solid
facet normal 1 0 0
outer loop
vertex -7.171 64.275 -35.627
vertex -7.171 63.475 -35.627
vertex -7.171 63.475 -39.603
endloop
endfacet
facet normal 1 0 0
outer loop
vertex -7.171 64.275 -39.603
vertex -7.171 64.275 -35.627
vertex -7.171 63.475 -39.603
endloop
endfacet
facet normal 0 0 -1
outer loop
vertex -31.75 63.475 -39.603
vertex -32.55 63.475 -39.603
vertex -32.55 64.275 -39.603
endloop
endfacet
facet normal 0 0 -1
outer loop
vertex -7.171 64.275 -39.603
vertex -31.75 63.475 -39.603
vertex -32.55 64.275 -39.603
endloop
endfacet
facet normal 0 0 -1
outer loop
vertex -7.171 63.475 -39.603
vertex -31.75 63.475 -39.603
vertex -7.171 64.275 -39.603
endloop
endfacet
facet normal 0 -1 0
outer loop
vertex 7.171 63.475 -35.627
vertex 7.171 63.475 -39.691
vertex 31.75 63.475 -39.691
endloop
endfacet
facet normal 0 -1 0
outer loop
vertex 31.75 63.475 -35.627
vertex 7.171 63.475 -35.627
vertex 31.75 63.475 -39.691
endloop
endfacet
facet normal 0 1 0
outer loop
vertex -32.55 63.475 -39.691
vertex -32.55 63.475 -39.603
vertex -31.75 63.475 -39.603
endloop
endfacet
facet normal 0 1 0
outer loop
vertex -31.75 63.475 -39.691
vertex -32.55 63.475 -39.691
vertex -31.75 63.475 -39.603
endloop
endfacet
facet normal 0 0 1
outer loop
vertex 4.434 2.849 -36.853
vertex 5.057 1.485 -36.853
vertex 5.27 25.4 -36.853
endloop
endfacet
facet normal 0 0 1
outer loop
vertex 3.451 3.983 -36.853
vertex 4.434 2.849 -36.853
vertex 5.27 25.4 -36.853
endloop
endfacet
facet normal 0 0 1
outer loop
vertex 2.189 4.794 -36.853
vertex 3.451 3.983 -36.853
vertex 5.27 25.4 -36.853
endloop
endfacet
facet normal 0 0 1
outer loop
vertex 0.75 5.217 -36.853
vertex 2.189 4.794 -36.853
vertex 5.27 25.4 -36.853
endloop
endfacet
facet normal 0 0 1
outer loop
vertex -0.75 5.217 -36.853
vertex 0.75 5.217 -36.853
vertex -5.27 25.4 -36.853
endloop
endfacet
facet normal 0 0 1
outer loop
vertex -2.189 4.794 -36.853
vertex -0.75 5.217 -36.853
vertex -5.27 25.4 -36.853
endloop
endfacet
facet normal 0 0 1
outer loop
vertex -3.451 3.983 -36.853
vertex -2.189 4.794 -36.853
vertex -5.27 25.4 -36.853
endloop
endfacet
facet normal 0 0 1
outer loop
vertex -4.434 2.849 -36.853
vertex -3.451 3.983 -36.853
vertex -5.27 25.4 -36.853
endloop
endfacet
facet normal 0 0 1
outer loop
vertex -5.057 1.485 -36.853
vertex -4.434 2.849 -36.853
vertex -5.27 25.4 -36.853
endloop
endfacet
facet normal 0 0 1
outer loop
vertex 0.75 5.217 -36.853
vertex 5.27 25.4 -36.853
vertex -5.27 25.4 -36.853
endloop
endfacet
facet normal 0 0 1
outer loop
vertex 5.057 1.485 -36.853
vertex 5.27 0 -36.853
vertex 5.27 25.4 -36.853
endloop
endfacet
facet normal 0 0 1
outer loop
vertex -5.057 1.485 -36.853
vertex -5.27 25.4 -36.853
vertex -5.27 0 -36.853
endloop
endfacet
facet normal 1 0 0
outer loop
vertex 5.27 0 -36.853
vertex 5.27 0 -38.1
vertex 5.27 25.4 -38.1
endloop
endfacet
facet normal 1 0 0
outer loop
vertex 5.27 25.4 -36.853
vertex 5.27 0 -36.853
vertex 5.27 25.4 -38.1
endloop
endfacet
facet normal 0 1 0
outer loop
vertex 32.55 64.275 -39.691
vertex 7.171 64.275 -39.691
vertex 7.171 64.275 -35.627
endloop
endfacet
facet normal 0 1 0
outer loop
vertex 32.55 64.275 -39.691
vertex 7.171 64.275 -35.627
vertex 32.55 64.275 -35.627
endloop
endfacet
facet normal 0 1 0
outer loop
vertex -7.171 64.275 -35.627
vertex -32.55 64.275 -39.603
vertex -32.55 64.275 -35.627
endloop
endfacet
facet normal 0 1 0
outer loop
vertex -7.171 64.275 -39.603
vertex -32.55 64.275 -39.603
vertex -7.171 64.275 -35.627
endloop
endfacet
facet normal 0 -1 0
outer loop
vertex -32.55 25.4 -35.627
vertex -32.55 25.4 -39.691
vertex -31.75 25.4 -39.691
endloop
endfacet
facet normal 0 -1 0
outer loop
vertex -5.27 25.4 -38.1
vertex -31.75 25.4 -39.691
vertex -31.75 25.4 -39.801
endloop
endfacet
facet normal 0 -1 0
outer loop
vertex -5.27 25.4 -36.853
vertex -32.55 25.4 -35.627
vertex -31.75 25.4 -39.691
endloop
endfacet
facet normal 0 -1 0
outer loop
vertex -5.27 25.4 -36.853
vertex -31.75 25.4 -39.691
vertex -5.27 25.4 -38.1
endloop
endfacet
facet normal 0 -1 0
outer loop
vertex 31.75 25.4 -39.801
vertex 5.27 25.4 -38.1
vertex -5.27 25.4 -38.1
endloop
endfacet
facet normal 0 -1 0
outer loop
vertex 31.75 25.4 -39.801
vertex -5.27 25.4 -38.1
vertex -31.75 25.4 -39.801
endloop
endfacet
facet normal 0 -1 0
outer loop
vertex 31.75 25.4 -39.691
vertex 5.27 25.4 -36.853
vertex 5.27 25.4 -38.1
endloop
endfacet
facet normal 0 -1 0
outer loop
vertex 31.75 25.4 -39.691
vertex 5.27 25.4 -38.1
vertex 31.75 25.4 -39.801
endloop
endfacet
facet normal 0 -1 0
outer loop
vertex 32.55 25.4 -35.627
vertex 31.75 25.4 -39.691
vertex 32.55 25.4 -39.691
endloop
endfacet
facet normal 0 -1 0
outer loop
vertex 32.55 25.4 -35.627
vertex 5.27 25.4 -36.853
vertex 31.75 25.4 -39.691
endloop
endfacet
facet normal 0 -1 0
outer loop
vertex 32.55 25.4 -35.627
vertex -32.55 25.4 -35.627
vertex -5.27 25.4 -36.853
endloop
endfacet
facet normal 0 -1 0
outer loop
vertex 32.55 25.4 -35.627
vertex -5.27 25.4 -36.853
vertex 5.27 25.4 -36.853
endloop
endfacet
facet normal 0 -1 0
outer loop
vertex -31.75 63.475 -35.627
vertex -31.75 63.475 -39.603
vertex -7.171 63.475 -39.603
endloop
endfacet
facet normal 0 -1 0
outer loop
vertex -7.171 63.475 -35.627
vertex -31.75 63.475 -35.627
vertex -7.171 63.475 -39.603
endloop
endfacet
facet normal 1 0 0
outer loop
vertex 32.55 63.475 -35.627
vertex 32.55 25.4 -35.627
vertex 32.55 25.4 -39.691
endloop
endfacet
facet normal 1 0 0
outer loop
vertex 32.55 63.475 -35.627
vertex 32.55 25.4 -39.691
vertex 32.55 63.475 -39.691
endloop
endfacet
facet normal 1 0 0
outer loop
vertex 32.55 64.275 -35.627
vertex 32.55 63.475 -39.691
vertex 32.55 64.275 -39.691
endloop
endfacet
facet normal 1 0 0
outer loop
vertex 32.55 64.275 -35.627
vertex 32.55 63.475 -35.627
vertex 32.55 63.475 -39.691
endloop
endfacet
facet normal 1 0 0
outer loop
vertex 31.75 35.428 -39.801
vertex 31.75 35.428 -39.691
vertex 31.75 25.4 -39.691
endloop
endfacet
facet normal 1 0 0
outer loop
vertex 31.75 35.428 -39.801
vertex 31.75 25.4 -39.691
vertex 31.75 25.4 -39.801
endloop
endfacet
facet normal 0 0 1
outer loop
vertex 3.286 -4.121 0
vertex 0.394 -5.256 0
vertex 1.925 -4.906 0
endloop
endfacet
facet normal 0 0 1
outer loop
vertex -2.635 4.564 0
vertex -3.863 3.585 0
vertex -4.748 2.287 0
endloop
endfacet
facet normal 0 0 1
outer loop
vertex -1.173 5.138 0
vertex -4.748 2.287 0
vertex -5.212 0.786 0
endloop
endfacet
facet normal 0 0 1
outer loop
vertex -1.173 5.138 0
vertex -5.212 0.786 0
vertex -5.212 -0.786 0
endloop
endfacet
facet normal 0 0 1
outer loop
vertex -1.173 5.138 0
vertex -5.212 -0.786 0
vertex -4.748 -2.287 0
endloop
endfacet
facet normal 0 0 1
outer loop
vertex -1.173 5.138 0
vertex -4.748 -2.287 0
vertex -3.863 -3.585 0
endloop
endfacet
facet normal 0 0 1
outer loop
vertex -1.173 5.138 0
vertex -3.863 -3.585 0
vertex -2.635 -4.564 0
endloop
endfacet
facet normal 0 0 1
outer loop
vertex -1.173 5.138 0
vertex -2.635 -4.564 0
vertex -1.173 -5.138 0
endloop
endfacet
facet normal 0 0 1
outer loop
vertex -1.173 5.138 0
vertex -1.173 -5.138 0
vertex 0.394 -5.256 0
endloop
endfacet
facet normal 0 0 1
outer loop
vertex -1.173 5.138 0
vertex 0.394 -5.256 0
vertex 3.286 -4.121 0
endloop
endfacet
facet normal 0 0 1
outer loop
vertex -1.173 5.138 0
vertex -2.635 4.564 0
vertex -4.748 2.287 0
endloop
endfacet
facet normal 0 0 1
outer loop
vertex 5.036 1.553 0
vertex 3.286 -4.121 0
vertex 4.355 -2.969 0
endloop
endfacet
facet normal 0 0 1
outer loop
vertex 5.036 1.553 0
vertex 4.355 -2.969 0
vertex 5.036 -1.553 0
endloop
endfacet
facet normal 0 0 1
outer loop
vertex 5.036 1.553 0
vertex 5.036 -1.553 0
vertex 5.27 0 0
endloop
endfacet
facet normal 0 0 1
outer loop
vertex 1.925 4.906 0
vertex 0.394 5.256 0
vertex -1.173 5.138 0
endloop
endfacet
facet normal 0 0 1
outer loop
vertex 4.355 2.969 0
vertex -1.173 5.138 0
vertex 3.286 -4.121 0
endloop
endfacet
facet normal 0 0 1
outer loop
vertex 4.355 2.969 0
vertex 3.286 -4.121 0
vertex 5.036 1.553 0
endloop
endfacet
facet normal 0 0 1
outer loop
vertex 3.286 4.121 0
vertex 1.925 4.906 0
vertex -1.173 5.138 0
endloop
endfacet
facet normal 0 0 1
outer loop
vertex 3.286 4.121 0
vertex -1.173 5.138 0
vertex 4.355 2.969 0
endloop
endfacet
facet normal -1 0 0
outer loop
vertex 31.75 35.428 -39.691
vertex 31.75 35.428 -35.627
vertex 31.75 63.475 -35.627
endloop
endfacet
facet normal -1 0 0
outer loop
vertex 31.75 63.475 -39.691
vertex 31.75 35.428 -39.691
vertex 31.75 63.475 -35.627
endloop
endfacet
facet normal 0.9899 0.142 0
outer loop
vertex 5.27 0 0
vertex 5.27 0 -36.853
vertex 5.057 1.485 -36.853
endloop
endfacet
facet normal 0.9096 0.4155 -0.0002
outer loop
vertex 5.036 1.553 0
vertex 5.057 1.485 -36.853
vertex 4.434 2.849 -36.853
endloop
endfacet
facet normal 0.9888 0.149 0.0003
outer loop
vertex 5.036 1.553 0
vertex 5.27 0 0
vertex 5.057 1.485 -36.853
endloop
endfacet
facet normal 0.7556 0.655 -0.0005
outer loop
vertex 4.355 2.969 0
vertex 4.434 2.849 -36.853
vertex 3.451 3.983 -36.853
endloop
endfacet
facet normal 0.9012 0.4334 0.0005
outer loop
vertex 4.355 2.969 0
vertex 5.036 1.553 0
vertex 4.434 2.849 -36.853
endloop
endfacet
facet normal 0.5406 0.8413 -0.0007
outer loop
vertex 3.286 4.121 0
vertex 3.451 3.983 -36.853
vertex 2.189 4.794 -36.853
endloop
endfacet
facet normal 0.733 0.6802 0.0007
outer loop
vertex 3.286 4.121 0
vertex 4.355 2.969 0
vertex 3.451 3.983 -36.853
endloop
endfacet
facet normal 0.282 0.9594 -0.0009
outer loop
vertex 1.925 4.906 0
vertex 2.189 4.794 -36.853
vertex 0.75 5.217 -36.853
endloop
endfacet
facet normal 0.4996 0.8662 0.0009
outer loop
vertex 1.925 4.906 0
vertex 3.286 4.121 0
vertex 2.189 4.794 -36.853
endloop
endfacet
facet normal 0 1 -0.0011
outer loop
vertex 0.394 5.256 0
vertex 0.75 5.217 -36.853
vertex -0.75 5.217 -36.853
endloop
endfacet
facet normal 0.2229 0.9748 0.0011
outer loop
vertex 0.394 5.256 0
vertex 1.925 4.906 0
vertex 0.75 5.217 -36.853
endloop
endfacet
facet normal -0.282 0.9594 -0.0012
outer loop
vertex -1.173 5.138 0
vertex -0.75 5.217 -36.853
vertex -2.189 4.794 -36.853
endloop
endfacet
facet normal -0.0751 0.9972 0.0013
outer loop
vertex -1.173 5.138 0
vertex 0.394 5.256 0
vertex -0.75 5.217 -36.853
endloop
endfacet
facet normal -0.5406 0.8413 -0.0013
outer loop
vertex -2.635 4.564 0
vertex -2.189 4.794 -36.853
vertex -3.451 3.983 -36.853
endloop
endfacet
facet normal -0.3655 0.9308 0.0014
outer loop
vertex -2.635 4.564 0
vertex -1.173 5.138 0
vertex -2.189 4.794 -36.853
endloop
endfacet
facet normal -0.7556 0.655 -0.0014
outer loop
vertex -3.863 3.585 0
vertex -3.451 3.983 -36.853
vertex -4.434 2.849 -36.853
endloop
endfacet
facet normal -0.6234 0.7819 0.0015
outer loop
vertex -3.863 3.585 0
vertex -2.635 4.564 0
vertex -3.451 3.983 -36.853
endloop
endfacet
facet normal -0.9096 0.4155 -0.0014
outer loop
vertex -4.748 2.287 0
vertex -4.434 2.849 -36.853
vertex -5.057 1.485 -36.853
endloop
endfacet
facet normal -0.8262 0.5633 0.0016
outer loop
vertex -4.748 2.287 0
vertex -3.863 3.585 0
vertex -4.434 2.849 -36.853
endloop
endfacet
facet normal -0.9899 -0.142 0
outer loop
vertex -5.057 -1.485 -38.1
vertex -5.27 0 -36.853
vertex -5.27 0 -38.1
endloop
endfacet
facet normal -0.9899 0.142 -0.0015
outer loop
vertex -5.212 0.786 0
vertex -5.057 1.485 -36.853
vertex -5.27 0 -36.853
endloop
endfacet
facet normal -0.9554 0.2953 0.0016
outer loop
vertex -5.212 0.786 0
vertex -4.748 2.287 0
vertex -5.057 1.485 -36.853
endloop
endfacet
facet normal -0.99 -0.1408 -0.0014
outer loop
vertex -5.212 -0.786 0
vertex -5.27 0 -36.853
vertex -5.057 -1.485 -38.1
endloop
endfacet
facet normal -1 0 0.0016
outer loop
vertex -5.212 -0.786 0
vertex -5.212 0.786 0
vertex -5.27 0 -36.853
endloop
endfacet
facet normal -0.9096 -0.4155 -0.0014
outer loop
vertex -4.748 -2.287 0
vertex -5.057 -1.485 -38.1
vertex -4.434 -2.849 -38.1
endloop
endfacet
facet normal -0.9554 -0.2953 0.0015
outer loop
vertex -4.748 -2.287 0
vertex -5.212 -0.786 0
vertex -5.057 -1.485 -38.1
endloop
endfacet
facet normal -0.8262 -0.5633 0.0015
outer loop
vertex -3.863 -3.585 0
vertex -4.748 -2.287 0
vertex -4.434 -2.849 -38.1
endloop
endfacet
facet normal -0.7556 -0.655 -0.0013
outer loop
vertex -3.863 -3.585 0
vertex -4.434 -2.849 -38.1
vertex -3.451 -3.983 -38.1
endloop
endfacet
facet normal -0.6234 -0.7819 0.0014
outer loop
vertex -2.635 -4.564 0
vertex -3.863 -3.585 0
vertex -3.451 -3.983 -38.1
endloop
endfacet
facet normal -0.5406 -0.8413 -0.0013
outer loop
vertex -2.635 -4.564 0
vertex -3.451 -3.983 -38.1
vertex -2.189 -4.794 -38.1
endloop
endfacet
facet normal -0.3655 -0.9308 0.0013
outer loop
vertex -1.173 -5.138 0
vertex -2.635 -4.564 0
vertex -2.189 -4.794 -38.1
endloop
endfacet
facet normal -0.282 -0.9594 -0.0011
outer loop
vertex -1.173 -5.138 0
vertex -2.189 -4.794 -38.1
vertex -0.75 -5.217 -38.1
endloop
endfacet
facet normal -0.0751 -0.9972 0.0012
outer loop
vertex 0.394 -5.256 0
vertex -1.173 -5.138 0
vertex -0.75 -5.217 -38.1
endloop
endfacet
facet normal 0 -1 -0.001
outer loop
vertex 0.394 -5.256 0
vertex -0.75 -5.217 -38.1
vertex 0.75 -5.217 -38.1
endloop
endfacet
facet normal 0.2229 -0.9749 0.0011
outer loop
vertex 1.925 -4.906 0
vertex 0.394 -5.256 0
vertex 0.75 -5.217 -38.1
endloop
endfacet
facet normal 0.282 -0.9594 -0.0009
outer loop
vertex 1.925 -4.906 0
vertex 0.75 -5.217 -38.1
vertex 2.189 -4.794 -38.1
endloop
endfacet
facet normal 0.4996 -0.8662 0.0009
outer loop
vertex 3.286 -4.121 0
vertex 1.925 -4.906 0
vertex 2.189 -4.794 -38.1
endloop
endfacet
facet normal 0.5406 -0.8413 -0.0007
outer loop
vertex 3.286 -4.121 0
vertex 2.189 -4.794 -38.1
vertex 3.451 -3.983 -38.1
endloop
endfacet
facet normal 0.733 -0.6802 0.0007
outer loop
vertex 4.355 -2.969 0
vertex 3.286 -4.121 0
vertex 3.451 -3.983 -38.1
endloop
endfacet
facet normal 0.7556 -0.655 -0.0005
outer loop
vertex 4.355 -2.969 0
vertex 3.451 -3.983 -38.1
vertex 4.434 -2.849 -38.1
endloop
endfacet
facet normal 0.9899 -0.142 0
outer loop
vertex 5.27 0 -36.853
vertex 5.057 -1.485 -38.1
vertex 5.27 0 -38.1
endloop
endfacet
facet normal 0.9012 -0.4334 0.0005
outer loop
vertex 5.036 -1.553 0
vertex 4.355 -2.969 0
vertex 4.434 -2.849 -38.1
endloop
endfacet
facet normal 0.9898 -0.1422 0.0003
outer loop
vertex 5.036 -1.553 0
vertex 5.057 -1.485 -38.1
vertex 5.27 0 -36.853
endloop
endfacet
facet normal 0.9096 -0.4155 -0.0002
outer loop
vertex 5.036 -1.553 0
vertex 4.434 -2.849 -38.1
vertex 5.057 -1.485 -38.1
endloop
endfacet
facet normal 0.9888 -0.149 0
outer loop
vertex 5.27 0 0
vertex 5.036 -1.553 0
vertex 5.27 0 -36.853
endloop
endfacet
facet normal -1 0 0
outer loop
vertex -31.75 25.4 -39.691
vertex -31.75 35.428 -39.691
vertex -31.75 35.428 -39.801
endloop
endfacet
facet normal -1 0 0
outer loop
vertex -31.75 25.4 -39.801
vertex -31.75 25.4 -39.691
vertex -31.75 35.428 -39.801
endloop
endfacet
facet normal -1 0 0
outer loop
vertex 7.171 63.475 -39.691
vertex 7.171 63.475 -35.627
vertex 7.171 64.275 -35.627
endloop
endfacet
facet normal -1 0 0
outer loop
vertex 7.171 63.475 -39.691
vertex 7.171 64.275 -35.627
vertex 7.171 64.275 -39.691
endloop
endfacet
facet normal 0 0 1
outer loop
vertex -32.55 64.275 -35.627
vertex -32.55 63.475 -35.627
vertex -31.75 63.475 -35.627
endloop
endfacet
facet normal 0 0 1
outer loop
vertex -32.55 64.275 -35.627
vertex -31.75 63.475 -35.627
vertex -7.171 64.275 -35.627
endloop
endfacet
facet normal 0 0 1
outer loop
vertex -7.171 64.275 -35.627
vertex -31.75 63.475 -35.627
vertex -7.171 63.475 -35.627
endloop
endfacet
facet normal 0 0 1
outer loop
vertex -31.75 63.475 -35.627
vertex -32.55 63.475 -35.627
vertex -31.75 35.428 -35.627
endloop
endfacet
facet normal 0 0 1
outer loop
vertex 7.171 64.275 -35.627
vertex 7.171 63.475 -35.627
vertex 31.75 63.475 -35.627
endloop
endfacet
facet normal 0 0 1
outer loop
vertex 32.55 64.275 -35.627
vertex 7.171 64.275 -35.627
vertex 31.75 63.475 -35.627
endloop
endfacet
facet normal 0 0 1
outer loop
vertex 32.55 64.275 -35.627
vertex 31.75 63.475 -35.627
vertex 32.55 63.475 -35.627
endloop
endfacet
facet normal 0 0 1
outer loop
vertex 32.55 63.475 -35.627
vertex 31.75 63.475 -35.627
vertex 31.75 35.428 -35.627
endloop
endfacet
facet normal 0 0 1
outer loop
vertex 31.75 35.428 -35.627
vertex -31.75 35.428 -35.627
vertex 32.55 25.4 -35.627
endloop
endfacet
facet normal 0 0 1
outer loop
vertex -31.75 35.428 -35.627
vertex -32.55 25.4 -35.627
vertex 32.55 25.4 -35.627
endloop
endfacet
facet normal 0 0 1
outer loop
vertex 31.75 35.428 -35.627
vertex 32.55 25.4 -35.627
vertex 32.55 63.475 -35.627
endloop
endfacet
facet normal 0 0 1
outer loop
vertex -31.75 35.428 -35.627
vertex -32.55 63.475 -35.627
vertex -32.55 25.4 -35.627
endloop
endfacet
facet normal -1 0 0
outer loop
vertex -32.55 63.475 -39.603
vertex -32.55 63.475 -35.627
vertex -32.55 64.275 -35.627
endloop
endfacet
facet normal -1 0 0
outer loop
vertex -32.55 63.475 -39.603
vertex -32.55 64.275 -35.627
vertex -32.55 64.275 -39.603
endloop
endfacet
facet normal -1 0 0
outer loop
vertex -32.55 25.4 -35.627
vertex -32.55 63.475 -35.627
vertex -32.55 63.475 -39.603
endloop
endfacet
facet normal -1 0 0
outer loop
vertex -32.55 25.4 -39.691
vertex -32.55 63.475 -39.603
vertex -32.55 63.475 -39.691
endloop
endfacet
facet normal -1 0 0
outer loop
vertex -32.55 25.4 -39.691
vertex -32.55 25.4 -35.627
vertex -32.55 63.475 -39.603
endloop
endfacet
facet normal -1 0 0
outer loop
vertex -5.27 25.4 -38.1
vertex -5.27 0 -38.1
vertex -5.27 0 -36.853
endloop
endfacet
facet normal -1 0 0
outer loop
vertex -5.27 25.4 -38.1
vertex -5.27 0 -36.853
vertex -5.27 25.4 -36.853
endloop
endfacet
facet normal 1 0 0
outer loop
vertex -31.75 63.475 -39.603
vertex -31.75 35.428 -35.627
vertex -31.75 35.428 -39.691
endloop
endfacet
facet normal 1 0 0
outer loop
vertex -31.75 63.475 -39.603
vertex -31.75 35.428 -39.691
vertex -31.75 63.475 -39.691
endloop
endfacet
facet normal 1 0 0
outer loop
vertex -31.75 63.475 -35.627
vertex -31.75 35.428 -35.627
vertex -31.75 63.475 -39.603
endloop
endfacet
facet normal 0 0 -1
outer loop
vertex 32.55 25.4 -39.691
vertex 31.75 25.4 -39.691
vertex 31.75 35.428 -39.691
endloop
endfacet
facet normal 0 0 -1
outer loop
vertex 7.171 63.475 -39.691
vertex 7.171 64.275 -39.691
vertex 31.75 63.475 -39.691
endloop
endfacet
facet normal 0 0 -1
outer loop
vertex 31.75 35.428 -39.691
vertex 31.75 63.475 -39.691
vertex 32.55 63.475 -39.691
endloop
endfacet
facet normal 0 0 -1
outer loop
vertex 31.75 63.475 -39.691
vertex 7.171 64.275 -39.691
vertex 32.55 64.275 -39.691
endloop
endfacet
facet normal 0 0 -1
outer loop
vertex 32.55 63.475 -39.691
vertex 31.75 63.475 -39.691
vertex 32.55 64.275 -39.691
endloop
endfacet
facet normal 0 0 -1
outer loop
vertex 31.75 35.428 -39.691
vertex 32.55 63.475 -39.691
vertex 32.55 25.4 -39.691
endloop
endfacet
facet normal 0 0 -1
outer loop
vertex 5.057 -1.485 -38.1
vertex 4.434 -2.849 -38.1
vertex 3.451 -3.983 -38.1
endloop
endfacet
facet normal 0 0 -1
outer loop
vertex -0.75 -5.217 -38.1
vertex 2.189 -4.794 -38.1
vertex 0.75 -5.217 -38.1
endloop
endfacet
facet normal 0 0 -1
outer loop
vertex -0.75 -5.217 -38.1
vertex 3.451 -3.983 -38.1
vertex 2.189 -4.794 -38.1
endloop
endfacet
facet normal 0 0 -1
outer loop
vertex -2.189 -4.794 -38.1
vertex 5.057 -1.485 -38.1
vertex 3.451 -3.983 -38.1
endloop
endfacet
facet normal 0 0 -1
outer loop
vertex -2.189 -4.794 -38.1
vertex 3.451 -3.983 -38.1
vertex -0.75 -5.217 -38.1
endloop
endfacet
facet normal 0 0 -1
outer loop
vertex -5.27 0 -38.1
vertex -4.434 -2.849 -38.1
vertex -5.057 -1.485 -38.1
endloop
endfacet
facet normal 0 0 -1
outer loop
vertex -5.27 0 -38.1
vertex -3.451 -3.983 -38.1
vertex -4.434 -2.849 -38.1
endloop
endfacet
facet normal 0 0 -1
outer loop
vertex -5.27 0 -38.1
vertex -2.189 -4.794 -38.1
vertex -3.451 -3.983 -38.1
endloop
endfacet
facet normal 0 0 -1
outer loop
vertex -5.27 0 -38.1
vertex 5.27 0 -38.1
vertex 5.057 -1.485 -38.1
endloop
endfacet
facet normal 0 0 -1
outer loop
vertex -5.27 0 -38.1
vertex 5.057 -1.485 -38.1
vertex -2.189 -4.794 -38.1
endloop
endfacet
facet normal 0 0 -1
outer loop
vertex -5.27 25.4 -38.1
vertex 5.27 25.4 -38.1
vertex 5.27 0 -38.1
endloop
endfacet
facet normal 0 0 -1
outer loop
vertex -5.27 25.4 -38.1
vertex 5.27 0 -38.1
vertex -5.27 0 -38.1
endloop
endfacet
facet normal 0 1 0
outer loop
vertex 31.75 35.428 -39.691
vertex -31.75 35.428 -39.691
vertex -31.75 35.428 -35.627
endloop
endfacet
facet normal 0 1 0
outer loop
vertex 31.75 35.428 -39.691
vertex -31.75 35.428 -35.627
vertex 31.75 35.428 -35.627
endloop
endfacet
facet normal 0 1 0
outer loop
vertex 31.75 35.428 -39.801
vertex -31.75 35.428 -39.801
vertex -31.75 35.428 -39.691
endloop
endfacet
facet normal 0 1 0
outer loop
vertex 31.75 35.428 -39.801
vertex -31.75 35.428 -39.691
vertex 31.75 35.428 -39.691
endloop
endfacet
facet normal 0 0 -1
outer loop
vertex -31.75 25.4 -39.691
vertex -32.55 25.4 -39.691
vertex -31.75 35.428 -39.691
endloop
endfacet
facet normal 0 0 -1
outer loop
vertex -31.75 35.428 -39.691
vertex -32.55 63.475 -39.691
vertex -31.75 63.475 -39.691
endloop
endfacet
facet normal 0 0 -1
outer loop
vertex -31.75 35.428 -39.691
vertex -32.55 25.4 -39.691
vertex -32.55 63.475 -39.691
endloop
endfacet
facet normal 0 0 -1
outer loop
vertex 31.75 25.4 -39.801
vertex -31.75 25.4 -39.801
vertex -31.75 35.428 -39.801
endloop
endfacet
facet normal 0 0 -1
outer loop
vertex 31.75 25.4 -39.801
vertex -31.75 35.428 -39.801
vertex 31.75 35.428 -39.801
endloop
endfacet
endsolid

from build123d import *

# Parameters (mm, degrees)
SKETCH1_R       = 5.270407467
FEATURE_A_DEPTH = 38.1
SKETCH2_W       = 10.540814934
SKETCH2_H       = 25.4
FEATURE_B_DEPTH = 1.246819584
SKETCH5_W       = 63.5
SKETCH5_H       = 4.173585558
FEATURE_C_DEPTH = 10.027755954
SKETCH6_W       = 0.800228097
SKETCH6_H       = 38.0746
FEATURE_D_DEPTH = 4.064
SKETCH7_W       = 25.37968
SKETCH7_H       = 3.975694803
SKETCH7_H_2     = 4.064
FEATURE_E_DEPTH = 0.800228097


with BuildPart() as part:
    # Sketch1 → Feature A (new body)
    with BuildSketch(Plane.XY):
        Circle(SKETCH1_R)
    extrude(amount=-FEATURE_A_DEPTH)

    # Sketch2 → Feature B (add)
    with BuildSketch(Plane(origin=(0, 0, -38.1), x_dir=(-1, 0, 0), z_dir=(0, 0, -1))):
        with Locations((0, 12.7)):
            Rectangle(SKETCH2_W, SKETCH2_H)
    extrude(amount=-FEATURE_B_DEPTH)

    # Sketch5 → Feature C (add)
    with BuildSketch(Plane(origin=(0, 25.4, 0), x_dir=(1, 0, 0), z_dir=(0, 1, 0))):
        with Locations((0, 37.71392)):
            Rectangle(SKETCH5_W, SKETCH5_H)
    extrude(amount=FEATURE_C_DEPTH)

    # Sketch6 → Feature D (add)
    with BuildSketch(Plane.XY.offset(-35.627127221)):
        with Locations((-32.150114049, 44.4373)):
            Rectangle(SKETCH6_W, SKETCH6_H)
        with Locations((32.150114049, 44.4373)):
            Rectangle(SKETCH6_W, SKETCH6_H)
    extrude(amount=-FEATURE_D_DEPTH)

    # Sketch7 → Feature E (add)
    with BuildSketch(Plane(origin=(0, 63.4746, 0), x_dir=(1, 0, 0), z_dir=(0, 1, 0))):
        with Locations((-19.860388097, 37.614974623)):
            Rectangle(SKETCH7_W, SKETCH7_H)
        with Locations((19.860388097, 37.659127221)):
            Rectangle(SKETCH7_W, SKETCH7_H_2)
    extrude(amount=FEATURE_E_DEPTH)


solid = part.part
